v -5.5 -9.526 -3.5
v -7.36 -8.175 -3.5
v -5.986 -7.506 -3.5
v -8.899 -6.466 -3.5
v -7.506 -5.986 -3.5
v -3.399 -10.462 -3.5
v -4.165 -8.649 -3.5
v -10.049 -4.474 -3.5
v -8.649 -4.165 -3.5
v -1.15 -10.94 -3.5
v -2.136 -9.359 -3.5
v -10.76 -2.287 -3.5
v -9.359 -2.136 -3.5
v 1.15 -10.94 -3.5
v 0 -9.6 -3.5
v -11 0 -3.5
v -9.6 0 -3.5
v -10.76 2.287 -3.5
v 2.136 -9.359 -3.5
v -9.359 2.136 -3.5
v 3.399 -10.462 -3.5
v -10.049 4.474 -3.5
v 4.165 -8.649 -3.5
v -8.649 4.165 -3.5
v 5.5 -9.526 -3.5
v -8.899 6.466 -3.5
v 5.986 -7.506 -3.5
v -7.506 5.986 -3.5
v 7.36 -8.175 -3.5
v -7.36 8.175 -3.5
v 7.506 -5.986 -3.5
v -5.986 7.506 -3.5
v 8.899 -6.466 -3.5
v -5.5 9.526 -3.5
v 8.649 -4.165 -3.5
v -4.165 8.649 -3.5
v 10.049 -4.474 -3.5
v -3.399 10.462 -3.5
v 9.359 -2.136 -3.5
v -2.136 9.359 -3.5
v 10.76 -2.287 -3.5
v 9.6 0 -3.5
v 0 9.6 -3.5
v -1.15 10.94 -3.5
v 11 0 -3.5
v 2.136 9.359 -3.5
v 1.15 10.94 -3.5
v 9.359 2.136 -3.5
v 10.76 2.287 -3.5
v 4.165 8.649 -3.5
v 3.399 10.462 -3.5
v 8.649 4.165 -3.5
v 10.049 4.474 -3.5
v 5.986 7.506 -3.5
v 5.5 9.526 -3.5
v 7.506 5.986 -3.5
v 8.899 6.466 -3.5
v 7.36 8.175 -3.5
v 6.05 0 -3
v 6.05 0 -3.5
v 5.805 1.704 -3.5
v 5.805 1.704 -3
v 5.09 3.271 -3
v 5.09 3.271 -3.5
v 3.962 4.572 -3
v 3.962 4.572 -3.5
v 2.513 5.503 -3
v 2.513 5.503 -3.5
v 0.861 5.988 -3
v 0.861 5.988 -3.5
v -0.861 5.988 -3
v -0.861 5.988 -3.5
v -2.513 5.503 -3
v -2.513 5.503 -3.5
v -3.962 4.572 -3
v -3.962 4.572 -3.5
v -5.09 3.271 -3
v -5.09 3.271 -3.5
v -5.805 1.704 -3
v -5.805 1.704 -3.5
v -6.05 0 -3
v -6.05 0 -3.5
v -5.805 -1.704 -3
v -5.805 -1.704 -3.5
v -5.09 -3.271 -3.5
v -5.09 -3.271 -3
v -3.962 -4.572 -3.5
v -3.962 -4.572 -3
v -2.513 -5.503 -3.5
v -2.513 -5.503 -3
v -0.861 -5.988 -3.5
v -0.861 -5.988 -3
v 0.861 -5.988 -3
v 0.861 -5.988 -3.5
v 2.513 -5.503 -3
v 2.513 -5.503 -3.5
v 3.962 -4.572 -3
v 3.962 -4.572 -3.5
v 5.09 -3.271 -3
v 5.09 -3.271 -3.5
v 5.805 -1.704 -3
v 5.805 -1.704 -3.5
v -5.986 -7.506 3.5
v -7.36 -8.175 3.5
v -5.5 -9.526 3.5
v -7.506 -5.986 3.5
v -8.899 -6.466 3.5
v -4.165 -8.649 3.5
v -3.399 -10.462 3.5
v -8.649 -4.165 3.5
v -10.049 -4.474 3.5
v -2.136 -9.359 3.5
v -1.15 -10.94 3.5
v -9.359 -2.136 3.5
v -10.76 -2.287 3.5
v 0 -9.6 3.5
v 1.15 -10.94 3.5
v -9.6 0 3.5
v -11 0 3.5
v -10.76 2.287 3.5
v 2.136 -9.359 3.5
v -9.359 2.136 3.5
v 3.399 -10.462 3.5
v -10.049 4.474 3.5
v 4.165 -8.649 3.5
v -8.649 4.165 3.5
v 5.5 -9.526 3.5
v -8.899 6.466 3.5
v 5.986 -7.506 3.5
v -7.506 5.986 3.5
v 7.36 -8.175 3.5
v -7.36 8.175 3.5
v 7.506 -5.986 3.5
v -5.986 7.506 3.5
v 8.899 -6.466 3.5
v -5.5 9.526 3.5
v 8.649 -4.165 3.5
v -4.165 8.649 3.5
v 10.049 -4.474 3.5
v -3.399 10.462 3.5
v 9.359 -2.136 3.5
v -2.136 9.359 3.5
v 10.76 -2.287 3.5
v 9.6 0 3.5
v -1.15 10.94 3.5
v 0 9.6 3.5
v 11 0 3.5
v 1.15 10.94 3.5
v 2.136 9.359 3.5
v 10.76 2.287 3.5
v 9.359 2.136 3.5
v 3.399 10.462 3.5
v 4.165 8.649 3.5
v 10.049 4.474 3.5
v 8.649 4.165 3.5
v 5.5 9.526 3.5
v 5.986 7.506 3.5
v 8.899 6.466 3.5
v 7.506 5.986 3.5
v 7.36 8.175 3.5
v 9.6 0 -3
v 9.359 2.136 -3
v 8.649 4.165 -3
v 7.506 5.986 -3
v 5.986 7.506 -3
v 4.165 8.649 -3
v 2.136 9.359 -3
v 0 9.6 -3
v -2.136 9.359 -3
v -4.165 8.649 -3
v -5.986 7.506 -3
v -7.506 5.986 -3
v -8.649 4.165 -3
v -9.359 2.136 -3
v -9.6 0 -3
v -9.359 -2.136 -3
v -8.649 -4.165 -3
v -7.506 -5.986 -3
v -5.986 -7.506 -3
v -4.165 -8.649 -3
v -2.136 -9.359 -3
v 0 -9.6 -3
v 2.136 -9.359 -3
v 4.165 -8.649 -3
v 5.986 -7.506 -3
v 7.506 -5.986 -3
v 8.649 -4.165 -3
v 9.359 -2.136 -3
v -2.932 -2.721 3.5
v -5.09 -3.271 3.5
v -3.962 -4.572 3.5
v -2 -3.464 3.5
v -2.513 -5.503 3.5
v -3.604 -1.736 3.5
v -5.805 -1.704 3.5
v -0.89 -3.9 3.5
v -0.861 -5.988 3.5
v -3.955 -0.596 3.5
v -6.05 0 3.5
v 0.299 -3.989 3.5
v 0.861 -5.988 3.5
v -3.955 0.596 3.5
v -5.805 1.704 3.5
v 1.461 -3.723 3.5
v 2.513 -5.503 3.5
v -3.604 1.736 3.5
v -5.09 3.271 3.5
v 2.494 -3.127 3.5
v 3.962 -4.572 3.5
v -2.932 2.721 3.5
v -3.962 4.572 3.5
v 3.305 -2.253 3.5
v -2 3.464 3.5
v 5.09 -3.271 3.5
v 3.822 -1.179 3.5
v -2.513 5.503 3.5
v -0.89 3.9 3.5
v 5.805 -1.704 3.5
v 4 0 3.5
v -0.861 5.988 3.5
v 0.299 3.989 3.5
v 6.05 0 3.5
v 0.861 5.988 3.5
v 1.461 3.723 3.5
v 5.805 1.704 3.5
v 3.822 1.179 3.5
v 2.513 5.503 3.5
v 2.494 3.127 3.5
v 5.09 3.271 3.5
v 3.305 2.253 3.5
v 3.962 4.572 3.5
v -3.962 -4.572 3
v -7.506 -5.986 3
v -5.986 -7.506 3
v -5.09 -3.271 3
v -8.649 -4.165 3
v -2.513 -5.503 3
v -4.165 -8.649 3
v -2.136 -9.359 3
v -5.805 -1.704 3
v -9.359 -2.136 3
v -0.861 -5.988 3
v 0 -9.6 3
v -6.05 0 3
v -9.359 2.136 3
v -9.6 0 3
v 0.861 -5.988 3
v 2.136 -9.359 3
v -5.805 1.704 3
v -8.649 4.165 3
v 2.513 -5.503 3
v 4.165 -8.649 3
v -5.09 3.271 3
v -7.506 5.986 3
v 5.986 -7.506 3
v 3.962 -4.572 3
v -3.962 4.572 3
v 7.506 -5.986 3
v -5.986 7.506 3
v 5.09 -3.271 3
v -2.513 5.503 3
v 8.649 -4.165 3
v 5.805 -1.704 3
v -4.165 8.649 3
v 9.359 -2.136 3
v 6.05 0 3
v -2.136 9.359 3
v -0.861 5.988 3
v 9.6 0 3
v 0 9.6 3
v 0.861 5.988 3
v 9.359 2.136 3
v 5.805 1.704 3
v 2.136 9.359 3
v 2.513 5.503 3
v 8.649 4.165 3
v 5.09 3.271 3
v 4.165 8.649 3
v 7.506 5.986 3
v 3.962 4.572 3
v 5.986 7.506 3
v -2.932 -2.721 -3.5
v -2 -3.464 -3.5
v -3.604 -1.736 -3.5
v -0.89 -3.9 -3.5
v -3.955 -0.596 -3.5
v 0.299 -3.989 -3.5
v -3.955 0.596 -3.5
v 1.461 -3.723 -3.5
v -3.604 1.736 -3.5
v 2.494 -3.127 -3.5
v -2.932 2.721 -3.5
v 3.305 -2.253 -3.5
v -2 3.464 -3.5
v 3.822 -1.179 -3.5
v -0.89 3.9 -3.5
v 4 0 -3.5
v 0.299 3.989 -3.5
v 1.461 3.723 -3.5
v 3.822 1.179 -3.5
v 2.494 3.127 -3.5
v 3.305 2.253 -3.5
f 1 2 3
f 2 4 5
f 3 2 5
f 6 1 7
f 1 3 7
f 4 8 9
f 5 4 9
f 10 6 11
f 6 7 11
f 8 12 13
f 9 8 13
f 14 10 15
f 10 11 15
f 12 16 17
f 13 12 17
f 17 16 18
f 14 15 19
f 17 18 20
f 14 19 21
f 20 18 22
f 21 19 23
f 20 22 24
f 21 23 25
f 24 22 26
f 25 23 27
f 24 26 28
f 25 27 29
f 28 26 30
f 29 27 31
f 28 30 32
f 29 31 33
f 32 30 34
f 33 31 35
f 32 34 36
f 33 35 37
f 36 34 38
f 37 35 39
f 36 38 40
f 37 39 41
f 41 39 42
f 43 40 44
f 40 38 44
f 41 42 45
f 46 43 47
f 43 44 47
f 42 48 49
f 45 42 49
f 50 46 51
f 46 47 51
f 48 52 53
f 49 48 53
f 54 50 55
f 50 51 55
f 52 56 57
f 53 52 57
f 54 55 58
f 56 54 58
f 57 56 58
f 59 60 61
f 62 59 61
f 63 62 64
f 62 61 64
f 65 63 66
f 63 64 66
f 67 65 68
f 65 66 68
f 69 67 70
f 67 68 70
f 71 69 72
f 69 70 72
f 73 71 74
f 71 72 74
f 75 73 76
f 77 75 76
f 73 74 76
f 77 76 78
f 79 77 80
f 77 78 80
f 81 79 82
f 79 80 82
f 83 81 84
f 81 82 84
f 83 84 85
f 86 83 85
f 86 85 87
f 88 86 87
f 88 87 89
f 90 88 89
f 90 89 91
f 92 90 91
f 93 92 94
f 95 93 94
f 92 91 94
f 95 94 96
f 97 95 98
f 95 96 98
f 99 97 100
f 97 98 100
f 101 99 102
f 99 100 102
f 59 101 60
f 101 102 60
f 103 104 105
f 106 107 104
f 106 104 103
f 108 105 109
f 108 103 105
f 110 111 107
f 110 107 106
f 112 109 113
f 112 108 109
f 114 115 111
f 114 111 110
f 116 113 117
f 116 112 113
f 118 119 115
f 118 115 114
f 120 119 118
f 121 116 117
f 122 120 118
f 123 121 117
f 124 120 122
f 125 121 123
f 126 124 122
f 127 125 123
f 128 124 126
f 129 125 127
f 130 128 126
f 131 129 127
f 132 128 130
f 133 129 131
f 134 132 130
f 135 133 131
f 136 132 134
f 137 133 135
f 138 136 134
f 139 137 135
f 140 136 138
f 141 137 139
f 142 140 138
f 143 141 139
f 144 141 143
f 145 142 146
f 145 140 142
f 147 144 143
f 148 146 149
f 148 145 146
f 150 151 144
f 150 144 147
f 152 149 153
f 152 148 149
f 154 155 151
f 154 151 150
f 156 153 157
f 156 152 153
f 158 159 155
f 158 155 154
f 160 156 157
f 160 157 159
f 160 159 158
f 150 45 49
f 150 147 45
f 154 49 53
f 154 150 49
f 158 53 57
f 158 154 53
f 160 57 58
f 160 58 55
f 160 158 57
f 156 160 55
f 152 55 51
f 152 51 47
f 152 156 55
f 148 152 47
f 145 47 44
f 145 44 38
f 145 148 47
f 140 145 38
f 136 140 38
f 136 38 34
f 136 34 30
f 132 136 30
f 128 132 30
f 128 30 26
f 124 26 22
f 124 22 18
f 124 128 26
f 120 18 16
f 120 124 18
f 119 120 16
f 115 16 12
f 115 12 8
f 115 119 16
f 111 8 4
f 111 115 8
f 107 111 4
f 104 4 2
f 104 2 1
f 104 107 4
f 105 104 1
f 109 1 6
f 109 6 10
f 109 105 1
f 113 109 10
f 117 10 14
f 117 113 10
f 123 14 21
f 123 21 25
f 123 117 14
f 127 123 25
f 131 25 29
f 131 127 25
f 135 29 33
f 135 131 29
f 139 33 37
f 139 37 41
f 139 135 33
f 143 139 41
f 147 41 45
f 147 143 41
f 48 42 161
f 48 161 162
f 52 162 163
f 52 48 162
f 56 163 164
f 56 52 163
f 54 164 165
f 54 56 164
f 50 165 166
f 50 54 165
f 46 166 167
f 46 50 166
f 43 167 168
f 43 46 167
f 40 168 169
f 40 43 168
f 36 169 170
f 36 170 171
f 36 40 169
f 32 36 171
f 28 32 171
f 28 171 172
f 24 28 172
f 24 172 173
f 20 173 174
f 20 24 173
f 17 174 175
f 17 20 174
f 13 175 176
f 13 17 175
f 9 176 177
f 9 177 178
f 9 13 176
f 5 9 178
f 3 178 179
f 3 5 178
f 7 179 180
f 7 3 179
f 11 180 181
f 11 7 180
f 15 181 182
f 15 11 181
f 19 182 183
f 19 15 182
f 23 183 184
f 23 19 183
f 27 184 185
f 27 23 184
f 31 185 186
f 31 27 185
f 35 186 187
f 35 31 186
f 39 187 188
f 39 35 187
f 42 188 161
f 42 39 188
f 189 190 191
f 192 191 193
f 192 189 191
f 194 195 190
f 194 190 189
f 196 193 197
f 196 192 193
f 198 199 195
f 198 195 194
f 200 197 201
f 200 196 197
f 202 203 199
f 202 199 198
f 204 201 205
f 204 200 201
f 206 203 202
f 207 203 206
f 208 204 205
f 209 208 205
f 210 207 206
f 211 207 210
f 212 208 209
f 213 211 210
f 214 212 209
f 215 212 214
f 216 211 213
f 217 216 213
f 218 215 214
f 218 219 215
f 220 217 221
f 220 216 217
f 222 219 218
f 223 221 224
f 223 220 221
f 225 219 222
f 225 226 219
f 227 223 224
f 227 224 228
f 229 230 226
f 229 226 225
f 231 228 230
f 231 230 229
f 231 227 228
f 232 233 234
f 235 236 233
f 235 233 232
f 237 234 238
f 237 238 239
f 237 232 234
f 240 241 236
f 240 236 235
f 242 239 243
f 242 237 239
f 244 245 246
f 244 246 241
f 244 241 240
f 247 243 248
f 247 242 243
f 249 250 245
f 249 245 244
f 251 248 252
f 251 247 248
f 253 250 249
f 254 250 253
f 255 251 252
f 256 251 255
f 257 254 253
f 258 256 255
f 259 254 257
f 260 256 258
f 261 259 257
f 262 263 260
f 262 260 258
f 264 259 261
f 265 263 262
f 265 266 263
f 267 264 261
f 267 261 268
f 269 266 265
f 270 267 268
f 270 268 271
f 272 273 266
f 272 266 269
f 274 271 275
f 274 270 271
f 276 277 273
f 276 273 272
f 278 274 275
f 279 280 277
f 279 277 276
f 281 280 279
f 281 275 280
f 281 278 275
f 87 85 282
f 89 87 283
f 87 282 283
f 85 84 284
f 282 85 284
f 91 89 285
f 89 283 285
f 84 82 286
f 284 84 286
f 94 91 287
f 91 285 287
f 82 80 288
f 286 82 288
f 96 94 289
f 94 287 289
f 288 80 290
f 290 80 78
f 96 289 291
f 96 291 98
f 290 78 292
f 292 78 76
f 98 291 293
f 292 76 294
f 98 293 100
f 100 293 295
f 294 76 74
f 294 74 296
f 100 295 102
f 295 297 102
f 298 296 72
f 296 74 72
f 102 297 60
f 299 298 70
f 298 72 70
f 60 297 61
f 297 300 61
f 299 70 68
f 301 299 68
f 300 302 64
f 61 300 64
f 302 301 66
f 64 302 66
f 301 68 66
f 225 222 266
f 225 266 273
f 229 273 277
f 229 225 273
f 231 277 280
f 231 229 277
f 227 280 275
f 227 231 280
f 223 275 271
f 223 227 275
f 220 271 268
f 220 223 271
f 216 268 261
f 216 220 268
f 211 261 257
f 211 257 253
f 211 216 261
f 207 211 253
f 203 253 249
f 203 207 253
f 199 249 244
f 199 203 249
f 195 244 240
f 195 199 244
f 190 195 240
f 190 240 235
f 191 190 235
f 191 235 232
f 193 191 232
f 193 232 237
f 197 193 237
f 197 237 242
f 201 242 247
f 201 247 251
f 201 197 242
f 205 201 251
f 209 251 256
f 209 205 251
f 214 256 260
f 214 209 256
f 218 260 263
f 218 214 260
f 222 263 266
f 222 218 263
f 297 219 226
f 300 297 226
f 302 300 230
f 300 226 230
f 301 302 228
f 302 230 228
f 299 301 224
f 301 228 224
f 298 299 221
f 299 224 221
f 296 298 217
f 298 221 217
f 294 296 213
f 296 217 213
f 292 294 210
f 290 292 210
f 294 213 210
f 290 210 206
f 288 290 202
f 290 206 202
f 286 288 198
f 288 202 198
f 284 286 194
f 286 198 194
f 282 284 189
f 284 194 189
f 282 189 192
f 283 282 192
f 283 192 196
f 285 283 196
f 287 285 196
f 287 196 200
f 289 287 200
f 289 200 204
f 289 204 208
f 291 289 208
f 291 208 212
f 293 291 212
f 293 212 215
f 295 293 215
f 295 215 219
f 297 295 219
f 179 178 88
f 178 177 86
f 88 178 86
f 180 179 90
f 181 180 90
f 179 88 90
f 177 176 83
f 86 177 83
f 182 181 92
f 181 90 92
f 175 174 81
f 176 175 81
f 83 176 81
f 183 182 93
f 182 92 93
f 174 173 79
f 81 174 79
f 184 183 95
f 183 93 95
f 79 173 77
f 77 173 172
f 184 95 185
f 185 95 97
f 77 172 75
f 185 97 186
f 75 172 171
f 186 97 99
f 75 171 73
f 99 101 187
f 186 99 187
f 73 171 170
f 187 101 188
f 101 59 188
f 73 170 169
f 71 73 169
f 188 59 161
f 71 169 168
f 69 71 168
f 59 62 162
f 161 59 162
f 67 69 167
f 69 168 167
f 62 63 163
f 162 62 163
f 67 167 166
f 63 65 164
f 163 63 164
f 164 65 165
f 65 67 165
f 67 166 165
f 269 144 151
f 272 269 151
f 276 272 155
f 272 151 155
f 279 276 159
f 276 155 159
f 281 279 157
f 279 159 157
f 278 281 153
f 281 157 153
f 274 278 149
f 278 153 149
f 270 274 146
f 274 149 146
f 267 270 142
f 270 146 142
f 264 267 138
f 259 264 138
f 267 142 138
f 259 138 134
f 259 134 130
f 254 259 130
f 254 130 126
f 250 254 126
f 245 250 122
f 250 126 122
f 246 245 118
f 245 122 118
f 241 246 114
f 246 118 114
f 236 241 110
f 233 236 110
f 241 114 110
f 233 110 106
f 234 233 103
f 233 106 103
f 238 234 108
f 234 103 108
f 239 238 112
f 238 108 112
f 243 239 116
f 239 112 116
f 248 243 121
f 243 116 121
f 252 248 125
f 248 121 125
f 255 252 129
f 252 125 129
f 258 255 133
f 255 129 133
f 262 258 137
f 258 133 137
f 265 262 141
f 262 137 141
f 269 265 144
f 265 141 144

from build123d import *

# Parameters (mm, degrees)
SKETCH_1_R          = 11
EXTRUDE_1_DEPTH     = 3.5
SKETCH_2_R          = 4
CUT_EXTRUDE_1_DEPTH = 8
SKETCH_3_R          = 9.6
SKETCH_3_R_2        = 6.05
CUT_EXTRUDE_2_DEPTH = 0.5


with BuildPart() as part:
    # 草圖1 → 填料-伸長1 (new body, symmetric)
    with BuildSketch(Plane.XY):
        Circle(SKETCH_1_R)
    extrude(amount=EXTRUDE_1_DEPTH, both=True)

    # 草圖2 → 除料-伸長1 (cut, through all)
    with BuildSketch(Plane.XY.offset(3.5)):
        Circle(SKETCH_2_R)
    extrude(amount=-CUT_EXTRUDE_1_DEPTH, mode=Mode.SUBTRACT)

    # 草圖3 → 除料-伸長2 (cut)
    with BuildSketch(Plane.XY.offset(3.5)):
        Circle(SKETCH_3_R)
        Circle(SKETCH_3_R_2, mode=Mode.SUBTRACT)
    cut_extrude_2 = extrude(amount=-CUT_EXTRUDE_2_DEPTH, mode=Mode.SUBTRACT)

    # 鏡射1: 除料-伸長2 across plane
    add(cut_extrude_2.mirror(Plane.XY), mode=Mode.SUBTRACT)


solid = part.part
